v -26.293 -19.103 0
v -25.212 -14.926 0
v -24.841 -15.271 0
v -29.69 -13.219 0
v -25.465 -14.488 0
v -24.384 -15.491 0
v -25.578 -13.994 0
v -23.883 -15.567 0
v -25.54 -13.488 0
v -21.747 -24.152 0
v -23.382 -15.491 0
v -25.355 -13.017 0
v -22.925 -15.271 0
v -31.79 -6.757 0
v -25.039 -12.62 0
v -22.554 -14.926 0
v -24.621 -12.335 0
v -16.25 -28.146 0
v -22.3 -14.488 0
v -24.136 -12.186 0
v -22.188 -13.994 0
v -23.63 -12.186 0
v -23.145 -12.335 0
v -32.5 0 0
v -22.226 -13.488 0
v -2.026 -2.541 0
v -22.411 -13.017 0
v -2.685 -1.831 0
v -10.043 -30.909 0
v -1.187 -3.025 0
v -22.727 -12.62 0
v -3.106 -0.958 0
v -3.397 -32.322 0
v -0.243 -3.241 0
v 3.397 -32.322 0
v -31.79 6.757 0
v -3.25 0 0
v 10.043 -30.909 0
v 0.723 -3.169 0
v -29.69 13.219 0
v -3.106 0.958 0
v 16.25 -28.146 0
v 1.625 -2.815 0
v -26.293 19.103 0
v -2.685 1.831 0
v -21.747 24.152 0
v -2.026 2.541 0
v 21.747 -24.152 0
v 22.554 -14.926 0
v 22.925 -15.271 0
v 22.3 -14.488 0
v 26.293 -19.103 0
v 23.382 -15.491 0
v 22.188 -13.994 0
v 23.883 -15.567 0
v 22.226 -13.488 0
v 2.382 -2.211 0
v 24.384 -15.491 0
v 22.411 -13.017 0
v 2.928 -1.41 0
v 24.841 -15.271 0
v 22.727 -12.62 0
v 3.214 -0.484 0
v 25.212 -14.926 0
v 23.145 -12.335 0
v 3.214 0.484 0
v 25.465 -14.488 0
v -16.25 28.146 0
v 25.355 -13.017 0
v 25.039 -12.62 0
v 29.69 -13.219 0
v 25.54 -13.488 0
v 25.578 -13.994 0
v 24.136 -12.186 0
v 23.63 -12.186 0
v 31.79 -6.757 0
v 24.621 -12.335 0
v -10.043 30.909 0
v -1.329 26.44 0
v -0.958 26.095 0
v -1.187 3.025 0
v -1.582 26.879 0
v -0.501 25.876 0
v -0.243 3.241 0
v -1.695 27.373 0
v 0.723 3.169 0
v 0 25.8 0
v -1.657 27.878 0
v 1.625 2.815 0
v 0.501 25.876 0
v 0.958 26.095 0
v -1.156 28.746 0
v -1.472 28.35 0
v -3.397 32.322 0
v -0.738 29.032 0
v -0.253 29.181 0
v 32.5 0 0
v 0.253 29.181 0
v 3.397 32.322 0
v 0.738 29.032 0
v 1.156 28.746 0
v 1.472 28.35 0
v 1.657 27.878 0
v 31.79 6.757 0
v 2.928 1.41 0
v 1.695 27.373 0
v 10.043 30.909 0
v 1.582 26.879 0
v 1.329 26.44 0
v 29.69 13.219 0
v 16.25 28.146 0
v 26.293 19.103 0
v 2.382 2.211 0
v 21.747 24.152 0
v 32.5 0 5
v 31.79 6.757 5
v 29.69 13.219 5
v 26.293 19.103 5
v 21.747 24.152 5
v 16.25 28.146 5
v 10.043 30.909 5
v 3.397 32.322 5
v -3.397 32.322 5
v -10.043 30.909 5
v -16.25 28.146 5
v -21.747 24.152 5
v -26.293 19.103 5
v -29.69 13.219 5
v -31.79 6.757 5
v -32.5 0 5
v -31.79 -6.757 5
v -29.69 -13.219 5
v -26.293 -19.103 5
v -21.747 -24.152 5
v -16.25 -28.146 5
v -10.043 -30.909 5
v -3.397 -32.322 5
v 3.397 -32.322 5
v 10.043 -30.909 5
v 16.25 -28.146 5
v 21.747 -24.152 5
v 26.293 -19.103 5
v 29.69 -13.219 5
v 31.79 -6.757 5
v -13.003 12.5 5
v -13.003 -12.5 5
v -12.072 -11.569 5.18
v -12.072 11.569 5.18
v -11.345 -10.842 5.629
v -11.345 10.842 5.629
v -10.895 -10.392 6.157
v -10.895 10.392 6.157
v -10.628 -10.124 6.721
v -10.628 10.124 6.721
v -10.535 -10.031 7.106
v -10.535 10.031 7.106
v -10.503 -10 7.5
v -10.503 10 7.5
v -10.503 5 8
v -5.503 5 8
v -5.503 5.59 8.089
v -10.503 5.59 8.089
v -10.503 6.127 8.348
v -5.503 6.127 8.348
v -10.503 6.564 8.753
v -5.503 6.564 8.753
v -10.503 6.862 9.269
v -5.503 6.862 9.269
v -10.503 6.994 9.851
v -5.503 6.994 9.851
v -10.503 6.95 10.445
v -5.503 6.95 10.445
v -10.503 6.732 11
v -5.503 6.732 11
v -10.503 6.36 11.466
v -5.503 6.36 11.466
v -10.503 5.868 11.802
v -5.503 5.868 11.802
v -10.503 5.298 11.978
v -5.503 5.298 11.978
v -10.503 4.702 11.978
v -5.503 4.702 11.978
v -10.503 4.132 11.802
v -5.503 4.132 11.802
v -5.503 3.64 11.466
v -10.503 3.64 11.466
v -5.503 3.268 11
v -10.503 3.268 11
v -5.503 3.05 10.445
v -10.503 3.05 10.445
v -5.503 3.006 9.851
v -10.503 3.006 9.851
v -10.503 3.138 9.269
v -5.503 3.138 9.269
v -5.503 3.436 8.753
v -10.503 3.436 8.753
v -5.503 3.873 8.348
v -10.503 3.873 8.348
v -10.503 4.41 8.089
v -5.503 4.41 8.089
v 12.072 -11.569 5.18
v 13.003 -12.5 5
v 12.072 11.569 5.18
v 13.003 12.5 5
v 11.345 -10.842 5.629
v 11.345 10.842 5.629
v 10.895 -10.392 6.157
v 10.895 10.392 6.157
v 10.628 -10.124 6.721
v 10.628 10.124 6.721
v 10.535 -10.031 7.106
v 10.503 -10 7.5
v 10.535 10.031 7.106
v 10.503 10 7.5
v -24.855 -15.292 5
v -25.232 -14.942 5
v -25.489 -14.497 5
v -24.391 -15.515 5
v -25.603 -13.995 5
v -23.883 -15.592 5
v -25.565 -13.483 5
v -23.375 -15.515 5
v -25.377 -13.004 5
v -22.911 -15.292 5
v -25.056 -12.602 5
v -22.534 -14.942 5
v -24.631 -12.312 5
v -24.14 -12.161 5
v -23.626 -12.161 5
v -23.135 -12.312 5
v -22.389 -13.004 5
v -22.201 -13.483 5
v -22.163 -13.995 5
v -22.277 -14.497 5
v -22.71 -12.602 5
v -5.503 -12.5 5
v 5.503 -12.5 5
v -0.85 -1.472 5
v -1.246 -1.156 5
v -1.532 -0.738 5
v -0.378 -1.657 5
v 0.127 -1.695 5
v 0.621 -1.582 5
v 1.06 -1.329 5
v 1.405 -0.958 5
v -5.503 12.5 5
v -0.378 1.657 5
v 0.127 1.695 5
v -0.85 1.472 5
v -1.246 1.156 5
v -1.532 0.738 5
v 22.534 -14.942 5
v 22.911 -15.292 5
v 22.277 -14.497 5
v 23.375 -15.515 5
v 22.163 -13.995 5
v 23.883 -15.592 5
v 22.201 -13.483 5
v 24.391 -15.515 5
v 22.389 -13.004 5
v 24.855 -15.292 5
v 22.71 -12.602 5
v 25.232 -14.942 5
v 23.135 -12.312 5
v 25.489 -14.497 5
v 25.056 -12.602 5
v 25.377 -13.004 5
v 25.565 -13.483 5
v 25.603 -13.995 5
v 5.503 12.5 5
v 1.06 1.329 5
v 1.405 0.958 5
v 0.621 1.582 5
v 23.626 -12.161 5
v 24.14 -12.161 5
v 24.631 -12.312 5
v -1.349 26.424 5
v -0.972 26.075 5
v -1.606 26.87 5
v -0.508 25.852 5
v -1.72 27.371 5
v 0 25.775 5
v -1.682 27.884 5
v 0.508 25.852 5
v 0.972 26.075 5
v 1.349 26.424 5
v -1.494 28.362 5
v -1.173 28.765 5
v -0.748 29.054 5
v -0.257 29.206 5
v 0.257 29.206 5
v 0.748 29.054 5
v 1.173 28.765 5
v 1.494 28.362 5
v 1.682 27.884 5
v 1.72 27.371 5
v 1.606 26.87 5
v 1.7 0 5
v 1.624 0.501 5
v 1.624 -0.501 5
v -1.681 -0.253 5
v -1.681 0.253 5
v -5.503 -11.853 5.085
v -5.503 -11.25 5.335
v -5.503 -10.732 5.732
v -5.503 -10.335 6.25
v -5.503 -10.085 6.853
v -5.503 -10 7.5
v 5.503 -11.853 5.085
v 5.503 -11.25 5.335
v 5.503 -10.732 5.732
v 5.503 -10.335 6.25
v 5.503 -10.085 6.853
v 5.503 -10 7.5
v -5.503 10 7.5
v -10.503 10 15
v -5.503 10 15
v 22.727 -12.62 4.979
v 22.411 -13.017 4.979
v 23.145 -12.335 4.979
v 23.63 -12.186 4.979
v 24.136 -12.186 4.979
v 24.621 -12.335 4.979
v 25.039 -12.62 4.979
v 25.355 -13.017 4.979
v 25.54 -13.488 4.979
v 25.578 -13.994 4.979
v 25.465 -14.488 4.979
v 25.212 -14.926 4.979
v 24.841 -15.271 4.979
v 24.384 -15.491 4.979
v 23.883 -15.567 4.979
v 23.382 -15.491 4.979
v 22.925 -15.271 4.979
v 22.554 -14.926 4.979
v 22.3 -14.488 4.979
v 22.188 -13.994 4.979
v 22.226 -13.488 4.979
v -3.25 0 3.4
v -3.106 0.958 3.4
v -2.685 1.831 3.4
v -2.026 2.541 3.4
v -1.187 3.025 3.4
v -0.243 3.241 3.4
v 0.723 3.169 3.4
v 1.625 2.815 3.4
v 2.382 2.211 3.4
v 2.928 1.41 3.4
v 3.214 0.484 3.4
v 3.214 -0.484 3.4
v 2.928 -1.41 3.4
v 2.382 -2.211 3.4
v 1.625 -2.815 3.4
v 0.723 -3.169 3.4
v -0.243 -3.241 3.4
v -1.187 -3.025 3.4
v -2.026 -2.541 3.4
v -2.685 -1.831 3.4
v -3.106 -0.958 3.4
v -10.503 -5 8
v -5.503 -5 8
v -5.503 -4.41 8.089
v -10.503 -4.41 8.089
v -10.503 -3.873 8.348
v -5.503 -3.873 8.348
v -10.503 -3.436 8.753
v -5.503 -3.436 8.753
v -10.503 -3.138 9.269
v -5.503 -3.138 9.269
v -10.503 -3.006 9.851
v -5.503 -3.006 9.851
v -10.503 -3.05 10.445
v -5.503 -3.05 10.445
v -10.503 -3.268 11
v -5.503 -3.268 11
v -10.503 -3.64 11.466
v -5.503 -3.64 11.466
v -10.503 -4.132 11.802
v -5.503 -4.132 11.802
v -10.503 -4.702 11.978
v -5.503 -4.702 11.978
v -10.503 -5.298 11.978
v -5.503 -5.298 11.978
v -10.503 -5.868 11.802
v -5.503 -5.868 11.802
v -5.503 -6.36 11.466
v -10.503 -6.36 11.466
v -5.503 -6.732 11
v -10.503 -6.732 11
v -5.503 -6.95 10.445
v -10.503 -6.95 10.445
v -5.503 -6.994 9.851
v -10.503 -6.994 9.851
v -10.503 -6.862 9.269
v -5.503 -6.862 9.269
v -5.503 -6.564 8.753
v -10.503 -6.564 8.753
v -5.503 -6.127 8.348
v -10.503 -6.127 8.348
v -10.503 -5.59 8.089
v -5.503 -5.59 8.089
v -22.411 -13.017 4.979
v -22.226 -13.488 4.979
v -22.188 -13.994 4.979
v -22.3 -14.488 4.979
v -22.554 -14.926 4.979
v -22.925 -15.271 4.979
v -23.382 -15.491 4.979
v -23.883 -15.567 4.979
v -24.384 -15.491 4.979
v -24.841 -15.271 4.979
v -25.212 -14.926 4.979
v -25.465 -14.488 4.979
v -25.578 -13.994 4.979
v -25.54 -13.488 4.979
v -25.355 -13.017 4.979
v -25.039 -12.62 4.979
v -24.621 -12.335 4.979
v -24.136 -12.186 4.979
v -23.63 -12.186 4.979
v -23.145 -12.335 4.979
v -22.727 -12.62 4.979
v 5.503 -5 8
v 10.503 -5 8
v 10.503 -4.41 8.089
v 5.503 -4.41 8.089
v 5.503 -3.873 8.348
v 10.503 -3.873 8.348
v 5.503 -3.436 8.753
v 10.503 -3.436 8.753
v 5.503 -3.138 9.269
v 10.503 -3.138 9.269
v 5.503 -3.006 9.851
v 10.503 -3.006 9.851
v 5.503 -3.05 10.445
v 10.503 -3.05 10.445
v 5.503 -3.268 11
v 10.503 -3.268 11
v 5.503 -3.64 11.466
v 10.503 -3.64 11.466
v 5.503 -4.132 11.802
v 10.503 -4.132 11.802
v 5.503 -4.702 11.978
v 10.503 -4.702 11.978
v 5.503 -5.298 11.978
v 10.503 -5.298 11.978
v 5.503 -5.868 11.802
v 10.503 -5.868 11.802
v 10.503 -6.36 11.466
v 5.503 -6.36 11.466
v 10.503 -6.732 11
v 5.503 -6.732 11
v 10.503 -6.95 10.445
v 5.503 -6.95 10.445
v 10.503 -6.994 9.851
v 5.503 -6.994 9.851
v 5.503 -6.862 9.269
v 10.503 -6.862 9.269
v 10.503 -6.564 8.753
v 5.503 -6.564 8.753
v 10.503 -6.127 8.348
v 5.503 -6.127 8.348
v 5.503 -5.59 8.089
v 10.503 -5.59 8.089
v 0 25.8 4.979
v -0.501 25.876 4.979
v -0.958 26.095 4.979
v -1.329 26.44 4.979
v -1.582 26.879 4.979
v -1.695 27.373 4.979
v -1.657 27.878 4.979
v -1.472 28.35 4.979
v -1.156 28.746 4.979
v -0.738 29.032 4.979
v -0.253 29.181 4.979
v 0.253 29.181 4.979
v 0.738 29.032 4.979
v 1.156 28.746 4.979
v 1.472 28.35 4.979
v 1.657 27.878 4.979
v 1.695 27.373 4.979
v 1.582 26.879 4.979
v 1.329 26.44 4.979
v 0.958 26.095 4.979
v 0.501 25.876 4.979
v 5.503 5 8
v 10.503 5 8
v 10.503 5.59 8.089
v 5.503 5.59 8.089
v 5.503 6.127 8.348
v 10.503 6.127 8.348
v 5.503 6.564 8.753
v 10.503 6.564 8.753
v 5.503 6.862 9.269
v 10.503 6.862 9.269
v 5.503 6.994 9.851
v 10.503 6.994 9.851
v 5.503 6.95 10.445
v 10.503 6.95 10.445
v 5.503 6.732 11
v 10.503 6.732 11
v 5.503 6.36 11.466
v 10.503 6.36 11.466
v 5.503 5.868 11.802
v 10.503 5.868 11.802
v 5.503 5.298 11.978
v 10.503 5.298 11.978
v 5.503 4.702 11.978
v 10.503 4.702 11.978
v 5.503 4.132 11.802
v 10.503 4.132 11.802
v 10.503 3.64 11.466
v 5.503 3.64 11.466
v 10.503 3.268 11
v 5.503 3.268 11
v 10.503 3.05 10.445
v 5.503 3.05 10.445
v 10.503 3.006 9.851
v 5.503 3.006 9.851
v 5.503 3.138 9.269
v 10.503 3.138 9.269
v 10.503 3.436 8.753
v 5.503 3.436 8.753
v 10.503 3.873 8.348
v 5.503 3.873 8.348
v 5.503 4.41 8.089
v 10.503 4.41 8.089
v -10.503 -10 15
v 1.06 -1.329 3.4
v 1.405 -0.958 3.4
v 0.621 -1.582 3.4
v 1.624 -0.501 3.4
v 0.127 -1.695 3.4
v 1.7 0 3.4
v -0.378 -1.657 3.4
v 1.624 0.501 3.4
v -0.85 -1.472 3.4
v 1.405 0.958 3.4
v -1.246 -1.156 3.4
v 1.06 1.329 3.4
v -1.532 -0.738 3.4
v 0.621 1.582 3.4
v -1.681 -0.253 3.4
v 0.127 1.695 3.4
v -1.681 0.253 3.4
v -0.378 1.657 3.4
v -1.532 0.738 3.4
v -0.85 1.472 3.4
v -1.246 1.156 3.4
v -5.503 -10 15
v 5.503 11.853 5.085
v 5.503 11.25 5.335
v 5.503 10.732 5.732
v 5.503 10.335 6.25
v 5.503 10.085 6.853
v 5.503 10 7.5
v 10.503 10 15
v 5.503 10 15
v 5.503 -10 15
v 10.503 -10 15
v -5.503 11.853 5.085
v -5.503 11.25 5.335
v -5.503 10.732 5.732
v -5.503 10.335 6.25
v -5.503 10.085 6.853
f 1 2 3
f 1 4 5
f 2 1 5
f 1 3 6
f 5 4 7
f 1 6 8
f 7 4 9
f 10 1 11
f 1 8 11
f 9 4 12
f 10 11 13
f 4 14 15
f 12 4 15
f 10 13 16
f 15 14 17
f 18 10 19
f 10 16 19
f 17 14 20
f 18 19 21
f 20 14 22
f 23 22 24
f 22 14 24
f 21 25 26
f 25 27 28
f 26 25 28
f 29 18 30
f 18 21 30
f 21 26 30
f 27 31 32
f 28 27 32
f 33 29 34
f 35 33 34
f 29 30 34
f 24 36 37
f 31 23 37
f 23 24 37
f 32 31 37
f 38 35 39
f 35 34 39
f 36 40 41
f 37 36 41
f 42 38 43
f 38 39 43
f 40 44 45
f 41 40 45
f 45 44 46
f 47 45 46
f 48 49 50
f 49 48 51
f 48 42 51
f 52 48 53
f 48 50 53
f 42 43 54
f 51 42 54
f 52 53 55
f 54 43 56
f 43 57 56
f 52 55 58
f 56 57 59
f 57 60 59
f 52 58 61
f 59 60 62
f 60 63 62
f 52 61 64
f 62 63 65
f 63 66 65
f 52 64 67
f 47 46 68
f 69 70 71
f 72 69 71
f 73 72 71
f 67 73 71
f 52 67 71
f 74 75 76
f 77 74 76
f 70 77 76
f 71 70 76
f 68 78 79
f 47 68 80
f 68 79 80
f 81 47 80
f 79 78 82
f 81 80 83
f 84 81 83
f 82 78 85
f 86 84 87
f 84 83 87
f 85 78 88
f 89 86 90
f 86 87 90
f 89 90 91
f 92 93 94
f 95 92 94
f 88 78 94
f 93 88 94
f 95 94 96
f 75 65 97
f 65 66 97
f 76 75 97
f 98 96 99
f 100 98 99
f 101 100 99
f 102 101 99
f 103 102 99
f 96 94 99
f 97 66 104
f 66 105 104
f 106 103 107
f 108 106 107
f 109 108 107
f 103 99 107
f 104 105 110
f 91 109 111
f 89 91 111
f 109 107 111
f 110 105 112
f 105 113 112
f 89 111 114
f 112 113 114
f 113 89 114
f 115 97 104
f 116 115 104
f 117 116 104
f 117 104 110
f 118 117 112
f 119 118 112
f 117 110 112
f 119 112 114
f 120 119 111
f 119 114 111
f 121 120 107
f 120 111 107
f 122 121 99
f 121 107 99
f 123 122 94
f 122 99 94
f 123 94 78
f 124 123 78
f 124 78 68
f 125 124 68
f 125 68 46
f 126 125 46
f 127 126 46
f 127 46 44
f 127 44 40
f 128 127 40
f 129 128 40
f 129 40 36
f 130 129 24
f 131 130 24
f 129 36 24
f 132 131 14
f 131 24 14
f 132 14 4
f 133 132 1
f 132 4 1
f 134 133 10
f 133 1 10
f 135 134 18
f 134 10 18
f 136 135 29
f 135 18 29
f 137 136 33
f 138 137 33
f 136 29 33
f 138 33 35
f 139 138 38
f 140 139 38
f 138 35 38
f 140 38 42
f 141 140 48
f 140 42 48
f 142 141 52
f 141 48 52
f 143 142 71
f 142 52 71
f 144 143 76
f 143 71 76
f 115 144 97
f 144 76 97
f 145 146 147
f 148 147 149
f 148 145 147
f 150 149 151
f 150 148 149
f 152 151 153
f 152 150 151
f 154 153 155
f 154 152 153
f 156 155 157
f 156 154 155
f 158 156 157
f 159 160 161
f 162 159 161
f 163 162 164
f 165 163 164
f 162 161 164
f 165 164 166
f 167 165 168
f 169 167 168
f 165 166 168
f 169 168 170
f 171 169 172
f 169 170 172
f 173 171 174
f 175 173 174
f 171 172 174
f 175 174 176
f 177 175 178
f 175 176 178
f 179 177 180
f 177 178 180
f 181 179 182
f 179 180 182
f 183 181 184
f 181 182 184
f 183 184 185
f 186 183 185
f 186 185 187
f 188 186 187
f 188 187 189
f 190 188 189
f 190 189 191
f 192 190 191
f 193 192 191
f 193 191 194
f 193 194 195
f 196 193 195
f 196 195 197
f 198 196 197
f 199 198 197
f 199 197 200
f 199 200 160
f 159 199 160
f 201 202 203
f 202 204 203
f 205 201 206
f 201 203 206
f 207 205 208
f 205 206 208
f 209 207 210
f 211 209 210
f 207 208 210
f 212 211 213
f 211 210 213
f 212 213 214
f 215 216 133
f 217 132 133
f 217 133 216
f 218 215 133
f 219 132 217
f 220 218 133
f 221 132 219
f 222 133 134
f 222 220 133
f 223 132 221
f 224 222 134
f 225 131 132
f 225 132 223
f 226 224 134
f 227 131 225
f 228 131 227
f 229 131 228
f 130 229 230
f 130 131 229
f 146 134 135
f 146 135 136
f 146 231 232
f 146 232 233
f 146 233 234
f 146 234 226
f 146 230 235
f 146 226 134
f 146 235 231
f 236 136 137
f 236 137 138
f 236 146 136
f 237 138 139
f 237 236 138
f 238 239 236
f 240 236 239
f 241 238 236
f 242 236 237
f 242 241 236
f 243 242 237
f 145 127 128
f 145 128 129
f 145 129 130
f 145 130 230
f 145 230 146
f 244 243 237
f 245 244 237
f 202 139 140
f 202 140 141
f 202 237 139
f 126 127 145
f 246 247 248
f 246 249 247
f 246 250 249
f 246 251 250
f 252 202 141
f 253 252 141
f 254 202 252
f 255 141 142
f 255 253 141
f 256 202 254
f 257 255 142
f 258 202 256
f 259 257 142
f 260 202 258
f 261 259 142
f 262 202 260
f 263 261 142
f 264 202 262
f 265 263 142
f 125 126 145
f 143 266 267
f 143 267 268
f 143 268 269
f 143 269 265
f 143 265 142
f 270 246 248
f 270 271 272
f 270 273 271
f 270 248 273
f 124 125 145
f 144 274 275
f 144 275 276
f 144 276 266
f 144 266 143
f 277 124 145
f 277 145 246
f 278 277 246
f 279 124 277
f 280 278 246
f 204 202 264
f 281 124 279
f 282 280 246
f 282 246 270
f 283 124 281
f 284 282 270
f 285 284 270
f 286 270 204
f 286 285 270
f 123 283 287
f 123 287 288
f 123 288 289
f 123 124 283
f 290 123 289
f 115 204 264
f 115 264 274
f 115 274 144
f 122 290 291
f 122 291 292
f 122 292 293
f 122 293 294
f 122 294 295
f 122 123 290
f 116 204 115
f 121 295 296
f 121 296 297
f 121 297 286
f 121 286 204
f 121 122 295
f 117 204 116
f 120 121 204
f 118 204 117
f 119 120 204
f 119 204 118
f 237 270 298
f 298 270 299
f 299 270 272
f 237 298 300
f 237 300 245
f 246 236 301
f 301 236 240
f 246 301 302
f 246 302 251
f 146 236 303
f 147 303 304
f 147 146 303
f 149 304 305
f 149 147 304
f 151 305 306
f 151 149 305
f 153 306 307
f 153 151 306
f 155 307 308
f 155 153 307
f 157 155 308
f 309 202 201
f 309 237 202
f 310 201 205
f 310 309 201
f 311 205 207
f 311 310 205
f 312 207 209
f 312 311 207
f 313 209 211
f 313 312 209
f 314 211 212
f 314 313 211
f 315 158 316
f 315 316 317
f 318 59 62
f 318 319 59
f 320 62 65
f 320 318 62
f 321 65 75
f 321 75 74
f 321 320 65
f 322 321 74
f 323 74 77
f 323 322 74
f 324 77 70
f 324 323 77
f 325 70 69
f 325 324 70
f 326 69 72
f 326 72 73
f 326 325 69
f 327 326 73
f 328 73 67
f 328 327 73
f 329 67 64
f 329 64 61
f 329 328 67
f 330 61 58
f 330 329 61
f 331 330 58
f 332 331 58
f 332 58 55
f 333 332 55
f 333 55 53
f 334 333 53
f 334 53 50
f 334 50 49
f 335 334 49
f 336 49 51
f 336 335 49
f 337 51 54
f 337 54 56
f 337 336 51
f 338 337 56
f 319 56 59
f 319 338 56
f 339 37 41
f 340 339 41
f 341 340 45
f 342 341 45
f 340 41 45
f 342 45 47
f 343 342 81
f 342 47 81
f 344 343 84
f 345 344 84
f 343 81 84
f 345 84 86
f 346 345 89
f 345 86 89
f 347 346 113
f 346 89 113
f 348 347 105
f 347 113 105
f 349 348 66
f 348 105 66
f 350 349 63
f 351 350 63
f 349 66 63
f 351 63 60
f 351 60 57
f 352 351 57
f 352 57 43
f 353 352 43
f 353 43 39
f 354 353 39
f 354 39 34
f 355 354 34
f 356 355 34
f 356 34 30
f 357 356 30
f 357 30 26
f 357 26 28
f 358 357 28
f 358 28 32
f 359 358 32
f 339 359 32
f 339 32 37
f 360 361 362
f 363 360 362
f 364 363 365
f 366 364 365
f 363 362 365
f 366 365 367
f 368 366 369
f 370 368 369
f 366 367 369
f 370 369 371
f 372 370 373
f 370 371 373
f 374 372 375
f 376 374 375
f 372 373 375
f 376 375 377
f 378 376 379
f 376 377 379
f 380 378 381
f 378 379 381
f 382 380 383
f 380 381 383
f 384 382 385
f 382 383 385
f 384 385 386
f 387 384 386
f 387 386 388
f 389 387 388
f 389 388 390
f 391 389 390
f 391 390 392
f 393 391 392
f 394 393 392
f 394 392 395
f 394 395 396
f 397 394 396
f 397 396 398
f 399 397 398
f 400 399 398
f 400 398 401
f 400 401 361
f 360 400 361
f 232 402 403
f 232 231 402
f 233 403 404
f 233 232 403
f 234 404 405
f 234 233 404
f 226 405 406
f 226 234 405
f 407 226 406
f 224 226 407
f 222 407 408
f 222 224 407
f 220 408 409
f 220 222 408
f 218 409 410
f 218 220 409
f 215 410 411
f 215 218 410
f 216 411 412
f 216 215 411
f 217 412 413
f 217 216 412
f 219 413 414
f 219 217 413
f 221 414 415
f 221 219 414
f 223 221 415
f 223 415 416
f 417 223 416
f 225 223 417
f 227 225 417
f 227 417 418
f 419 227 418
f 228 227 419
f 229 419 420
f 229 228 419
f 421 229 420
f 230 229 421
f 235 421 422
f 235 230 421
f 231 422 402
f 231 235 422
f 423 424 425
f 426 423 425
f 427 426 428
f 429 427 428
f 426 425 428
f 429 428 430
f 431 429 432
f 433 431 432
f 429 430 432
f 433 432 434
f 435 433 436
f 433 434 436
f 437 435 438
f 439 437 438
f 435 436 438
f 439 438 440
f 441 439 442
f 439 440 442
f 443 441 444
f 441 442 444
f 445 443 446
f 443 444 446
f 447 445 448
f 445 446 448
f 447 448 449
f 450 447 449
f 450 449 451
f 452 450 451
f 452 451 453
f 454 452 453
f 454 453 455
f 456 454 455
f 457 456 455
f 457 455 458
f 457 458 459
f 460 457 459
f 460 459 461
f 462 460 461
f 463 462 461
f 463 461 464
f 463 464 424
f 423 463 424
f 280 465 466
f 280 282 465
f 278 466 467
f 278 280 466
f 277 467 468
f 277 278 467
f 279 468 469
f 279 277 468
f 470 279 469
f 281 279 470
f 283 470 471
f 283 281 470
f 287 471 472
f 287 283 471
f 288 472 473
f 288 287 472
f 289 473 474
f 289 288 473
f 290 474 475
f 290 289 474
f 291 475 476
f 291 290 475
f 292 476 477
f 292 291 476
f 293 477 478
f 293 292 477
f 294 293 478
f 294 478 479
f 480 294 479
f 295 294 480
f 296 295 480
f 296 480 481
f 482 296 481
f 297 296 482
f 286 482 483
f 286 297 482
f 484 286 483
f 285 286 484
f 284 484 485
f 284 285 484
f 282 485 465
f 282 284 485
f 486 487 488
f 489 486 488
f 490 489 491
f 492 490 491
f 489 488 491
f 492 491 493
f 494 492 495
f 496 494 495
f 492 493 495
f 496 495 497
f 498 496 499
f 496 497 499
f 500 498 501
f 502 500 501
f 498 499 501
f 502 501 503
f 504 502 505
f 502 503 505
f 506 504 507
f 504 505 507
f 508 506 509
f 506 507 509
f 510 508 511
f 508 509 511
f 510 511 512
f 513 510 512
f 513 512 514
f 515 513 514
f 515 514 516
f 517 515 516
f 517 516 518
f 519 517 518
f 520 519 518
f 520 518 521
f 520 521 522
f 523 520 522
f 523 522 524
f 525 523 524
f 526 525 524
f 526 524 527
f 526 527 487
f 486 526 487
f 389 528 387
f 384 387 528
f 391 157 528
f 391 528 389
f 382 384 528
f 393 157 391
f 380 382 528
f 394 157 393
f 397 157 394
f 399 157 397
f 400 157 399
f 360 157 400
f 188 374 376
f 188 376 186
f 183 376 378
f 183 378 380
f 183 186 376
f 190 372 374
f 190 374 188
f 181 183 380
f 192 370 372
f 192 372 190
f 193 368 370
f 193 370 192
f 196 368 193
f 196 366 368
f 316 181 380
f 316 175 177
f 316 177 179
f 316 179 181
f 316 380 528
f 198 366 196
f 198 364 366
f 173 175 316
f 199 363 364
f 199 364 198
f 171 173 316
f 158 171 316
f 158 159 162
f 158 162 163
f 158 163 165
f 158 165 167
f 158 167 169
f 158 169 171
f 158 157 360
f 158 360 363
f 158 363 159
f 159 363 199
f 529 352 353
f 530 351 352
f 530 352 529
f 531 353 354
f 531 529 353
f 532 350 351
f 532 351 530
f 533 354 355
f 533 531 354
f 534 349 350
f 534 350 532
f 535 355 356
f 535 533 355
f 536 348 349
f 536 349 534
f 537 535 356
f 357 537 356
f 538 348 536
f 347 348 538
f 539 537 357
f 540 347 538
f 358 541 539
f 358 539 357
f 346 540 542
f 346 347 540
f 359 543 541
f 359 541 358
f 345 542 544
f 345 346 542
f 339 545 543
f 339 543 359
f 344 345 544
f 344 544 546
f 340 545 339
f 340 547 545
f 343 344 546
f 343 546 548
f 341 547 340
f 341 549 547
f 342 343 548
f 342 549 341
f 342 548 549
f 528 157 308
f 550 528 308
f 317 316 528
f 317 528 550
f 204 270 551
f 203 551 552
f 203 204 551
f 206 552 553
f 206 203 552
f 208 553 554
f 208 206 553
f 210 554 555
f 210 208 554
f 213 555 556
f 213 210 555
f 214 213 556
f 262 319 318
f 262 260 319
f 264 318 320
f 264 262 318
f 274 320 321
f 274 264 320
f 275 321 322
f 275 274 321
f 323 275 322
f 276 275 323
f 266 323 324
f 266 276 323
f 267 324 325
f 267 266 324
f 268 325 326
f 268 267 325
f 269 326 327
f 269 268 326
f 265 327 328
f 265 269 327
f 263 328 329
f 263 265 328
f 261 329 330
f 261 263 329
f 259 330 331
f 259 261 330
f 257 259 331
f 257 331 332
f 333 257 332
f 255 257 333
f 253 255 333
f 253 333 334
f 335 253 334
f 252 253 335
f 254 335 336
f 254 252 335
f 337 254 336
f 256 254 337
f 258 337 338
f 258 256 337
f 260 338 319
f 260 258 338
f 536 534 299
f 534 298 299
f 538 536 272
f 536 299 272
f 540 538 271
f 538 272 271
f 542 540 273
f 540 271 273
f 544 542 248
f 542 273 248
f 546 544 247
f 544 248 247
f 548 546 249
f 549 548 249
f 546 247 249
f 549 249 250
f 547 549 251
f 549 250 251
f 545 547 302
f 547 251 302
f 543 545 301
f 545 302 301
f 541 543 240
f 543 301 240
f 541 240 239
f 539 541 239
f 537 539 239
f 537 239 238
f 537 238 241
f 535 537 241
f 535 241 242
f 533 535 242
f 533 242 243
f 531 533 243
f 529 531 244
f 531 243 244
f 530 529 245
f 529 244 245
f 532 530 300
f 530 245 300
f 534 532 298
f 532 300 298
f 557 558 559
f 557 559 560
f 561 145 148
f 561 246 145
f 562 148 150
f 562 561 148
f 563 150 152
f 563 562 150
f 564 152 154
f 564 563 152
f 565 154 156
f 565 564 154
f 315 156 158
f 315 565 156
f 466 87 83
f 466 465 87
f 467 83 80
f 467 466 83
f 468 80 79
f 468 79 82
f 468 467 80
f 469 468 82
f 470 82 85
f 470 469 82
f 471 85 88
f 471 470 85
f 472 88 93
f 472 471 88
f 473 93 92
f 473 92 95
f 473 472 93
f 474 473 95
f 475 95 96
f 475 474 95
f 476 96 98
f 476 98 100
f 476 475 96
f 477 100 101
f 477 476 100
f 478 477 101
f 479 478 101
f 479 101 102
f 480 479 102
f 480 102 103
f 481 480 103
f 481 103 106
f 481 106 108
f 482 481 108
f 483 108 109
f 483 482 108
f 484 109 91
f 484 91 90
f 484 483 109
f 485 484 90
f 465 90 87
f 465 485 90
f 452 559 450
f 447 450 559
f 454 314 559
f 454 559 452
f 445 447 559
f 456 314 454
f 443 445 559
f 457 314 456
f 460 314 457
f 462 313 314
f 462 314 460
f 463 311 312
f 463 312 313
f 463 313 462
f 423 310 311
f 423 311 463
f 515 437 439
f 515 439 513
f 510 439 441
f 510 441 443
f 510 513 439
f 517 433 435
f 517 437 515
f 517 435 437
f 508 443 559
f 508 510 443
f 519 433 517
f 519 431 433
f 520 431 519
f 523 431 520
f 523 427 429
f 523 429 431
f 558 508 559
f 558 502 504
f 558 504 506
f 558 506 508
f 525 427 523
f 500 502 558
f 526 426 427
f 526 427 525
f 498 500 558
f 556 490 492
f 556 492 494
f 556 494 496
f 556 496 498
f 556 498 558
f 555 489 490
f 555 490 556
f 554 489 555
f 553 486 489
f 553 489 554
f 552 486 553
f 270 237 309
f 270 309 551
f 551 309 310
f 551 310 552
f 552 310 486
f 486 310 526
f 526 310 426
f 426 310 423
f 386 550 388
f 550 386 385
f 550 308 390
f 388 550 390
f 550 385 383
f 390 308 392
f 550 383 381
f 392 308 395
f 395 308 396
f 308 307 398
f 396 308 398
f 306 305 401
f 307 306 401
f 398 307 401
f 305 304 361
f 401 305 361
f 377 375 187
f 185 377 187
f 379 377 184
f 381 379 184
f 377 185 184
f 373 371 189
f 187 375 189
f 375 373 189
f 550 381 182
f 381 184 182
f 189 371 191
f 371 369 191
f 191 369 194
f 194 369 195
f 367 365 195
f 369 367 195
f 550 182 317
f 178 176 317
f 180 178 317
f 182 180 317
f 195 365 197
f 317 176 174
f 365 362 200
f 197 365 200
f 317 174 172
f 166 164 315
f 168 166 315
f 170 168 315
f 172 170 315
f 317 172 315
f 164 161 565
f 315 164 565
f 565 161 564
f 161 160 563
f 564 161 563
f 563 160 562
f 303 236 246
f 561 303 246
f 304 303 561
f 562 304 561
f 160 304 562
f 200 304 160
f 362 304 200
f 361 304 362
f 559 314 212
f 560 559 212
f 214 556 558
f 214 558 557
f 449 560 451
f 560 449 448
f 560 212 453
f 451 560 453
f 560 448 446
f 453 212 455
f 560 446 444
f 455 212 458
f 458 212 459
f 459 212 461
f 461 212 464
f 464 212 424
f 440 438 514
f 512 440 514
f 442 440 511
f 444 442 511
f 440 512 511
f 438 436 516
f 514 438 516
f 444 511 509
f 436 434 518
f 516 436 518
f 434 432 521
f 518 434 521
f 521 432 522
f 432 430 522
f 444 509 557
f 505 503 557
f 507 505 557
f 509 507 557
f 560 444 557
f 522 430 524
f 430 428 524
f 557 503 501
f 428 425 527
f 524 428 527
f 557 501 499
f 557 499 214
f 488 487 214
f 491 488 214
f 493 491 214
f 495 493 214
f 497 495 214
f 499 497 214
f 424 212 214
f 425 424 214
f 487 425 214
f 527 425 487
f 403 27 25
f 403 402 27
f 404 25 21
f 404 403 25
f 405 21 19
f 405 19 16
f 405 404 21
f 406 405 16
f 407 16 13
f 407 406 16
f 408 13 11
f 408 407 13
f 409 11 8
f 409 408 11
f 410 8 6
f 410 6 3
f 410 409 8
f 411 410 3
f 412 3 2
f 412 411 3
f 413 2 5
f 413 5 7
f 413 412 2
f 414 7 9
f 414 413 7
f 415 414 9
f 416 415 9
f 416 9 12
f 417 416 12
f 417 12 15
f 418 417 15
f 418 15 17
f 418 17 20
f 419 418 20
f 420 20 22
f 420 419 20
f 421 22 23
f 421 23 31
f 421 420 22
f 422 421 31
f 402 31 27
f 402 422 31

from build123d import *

# Parameters (mm, degrees)
SKETCH_1_R                     = 32.5
EXTRUDE_1_DEPTH                = 5
PATTERN_CIRCULAR_1_COUNT       = 3
SKETCH_5_W                     = 5
SKETCH_5_H                     = 20
EXTRUDE_2_DEPTH                = 10
HOLE_WIZARD_M3_1_2_D           = 3.4
HOLE_WIZARD_M3_1_2_CBORE_D     = 6.5
HOLE_WIZARD_M3_1_2_CBORE_DEPTH = 3.4
F_4_0MM_1_D                    = 4
FILLET_1_R                     = 2.5
FILLET_2_R                     = 2.5


with BuildPart() as part:
    # 스케치1 → 보스-돌출1 (new body)
    with BuildSketch(Plane.XY):
        Circle(SKETCH_1_R)
    extrude(amount=EXTRUDE_1_DEPTH)

    # 스케치4 → Hole Wizard M3 _ _1 (revolve, cut)
    with BuildSketch(Plane(origin=(0, 27.5, 5), x_dir=(0, -1, 0), z_dir=(1, 0, 0))):
        Polygon((0, 0), (0, 6.021463052), (1.7, 5), (1.7, 0.020977491), (1.725, 0), align=None)
    hole_wizard_m3_1 = revolve(axis=Axis((0, 27.5, 11.35), (0, 0, -1)), mode=Mode.SUBTRACT)

    # 원형 패턴1: Hole Wizard M3 _ _1 ×3 about axis
    pattern_circular_1_axis = Axis((0, -0.077690761, 0), (0, 0, 1))
    for i in range(1, PATTERN_CIRCULAR_1_COUNT):
        add(hole_wizard_m3_1.rotate(pattern_circular_1_axis, i * 360 / PATTERN_CIRCULAR_1_COUNT), mode=Mode.SUBTRACT)

    # 스케치5 → 보스-돌출2 (add)
    with BuildSketch(Plane.XY.offset(5)):
        with Locations((-8.003327874, 0)):
            Rectangle(SKETCH_5_W, SKETCH_5_H)
        with Locations((8.003327874, 0)):
            Rectangle(SKETCH_5_W, SKETCH_5_H)
    extrude(amount=EXTRUDE_2_DEPTH)

    # Hole Wizard M3 _ _ _ _ _ _1 2 (through all)
    with Locations(Plane(origin=(0, 0, 0), x_dir=(-1, 0, 0), z_dir=(0, 0, -1))):
        with Locations((0, 0)):
            CounterBoreHole(HOLE_WIZARD_M3_1_2_D / 2, HOLE_WIZARD_M3_1_2_CBORE_D / 2, HOLE_WIZARD_M3_1_2_CBORE_DEPTH)

    # Ø4.0mm 맞춤핀 구멍1 (through all)
    with Locations(Plane.ZY.offset(10.503327874)):
        with Locations((10, 5), (10, -5)):
            Hole(F_4_0MM_1_D / 2)

    # 필렛1
    fillet_1_edges = [part.edges().sort_by_distance(p)[0] for p in [
        (-10.503327874, 0, 5),
        (10.503327874, 0, 5),
    ]]
    fillet(fillet_1_edges, radius=FILLET_1_R)

    # 필렛2
    fillet_2_edges = [part.edges().sort_by_distance(p)[0] for p in [
        (8.003327874, -10, 5),
        (-8.003327874, -10, 5),
        (8.003327874, 10, 5),
        (-8.003327874, 10, 5),
    ]]
    fillet(fillet_2_edges, radius=FILLET_2_R)


solid = part.part
